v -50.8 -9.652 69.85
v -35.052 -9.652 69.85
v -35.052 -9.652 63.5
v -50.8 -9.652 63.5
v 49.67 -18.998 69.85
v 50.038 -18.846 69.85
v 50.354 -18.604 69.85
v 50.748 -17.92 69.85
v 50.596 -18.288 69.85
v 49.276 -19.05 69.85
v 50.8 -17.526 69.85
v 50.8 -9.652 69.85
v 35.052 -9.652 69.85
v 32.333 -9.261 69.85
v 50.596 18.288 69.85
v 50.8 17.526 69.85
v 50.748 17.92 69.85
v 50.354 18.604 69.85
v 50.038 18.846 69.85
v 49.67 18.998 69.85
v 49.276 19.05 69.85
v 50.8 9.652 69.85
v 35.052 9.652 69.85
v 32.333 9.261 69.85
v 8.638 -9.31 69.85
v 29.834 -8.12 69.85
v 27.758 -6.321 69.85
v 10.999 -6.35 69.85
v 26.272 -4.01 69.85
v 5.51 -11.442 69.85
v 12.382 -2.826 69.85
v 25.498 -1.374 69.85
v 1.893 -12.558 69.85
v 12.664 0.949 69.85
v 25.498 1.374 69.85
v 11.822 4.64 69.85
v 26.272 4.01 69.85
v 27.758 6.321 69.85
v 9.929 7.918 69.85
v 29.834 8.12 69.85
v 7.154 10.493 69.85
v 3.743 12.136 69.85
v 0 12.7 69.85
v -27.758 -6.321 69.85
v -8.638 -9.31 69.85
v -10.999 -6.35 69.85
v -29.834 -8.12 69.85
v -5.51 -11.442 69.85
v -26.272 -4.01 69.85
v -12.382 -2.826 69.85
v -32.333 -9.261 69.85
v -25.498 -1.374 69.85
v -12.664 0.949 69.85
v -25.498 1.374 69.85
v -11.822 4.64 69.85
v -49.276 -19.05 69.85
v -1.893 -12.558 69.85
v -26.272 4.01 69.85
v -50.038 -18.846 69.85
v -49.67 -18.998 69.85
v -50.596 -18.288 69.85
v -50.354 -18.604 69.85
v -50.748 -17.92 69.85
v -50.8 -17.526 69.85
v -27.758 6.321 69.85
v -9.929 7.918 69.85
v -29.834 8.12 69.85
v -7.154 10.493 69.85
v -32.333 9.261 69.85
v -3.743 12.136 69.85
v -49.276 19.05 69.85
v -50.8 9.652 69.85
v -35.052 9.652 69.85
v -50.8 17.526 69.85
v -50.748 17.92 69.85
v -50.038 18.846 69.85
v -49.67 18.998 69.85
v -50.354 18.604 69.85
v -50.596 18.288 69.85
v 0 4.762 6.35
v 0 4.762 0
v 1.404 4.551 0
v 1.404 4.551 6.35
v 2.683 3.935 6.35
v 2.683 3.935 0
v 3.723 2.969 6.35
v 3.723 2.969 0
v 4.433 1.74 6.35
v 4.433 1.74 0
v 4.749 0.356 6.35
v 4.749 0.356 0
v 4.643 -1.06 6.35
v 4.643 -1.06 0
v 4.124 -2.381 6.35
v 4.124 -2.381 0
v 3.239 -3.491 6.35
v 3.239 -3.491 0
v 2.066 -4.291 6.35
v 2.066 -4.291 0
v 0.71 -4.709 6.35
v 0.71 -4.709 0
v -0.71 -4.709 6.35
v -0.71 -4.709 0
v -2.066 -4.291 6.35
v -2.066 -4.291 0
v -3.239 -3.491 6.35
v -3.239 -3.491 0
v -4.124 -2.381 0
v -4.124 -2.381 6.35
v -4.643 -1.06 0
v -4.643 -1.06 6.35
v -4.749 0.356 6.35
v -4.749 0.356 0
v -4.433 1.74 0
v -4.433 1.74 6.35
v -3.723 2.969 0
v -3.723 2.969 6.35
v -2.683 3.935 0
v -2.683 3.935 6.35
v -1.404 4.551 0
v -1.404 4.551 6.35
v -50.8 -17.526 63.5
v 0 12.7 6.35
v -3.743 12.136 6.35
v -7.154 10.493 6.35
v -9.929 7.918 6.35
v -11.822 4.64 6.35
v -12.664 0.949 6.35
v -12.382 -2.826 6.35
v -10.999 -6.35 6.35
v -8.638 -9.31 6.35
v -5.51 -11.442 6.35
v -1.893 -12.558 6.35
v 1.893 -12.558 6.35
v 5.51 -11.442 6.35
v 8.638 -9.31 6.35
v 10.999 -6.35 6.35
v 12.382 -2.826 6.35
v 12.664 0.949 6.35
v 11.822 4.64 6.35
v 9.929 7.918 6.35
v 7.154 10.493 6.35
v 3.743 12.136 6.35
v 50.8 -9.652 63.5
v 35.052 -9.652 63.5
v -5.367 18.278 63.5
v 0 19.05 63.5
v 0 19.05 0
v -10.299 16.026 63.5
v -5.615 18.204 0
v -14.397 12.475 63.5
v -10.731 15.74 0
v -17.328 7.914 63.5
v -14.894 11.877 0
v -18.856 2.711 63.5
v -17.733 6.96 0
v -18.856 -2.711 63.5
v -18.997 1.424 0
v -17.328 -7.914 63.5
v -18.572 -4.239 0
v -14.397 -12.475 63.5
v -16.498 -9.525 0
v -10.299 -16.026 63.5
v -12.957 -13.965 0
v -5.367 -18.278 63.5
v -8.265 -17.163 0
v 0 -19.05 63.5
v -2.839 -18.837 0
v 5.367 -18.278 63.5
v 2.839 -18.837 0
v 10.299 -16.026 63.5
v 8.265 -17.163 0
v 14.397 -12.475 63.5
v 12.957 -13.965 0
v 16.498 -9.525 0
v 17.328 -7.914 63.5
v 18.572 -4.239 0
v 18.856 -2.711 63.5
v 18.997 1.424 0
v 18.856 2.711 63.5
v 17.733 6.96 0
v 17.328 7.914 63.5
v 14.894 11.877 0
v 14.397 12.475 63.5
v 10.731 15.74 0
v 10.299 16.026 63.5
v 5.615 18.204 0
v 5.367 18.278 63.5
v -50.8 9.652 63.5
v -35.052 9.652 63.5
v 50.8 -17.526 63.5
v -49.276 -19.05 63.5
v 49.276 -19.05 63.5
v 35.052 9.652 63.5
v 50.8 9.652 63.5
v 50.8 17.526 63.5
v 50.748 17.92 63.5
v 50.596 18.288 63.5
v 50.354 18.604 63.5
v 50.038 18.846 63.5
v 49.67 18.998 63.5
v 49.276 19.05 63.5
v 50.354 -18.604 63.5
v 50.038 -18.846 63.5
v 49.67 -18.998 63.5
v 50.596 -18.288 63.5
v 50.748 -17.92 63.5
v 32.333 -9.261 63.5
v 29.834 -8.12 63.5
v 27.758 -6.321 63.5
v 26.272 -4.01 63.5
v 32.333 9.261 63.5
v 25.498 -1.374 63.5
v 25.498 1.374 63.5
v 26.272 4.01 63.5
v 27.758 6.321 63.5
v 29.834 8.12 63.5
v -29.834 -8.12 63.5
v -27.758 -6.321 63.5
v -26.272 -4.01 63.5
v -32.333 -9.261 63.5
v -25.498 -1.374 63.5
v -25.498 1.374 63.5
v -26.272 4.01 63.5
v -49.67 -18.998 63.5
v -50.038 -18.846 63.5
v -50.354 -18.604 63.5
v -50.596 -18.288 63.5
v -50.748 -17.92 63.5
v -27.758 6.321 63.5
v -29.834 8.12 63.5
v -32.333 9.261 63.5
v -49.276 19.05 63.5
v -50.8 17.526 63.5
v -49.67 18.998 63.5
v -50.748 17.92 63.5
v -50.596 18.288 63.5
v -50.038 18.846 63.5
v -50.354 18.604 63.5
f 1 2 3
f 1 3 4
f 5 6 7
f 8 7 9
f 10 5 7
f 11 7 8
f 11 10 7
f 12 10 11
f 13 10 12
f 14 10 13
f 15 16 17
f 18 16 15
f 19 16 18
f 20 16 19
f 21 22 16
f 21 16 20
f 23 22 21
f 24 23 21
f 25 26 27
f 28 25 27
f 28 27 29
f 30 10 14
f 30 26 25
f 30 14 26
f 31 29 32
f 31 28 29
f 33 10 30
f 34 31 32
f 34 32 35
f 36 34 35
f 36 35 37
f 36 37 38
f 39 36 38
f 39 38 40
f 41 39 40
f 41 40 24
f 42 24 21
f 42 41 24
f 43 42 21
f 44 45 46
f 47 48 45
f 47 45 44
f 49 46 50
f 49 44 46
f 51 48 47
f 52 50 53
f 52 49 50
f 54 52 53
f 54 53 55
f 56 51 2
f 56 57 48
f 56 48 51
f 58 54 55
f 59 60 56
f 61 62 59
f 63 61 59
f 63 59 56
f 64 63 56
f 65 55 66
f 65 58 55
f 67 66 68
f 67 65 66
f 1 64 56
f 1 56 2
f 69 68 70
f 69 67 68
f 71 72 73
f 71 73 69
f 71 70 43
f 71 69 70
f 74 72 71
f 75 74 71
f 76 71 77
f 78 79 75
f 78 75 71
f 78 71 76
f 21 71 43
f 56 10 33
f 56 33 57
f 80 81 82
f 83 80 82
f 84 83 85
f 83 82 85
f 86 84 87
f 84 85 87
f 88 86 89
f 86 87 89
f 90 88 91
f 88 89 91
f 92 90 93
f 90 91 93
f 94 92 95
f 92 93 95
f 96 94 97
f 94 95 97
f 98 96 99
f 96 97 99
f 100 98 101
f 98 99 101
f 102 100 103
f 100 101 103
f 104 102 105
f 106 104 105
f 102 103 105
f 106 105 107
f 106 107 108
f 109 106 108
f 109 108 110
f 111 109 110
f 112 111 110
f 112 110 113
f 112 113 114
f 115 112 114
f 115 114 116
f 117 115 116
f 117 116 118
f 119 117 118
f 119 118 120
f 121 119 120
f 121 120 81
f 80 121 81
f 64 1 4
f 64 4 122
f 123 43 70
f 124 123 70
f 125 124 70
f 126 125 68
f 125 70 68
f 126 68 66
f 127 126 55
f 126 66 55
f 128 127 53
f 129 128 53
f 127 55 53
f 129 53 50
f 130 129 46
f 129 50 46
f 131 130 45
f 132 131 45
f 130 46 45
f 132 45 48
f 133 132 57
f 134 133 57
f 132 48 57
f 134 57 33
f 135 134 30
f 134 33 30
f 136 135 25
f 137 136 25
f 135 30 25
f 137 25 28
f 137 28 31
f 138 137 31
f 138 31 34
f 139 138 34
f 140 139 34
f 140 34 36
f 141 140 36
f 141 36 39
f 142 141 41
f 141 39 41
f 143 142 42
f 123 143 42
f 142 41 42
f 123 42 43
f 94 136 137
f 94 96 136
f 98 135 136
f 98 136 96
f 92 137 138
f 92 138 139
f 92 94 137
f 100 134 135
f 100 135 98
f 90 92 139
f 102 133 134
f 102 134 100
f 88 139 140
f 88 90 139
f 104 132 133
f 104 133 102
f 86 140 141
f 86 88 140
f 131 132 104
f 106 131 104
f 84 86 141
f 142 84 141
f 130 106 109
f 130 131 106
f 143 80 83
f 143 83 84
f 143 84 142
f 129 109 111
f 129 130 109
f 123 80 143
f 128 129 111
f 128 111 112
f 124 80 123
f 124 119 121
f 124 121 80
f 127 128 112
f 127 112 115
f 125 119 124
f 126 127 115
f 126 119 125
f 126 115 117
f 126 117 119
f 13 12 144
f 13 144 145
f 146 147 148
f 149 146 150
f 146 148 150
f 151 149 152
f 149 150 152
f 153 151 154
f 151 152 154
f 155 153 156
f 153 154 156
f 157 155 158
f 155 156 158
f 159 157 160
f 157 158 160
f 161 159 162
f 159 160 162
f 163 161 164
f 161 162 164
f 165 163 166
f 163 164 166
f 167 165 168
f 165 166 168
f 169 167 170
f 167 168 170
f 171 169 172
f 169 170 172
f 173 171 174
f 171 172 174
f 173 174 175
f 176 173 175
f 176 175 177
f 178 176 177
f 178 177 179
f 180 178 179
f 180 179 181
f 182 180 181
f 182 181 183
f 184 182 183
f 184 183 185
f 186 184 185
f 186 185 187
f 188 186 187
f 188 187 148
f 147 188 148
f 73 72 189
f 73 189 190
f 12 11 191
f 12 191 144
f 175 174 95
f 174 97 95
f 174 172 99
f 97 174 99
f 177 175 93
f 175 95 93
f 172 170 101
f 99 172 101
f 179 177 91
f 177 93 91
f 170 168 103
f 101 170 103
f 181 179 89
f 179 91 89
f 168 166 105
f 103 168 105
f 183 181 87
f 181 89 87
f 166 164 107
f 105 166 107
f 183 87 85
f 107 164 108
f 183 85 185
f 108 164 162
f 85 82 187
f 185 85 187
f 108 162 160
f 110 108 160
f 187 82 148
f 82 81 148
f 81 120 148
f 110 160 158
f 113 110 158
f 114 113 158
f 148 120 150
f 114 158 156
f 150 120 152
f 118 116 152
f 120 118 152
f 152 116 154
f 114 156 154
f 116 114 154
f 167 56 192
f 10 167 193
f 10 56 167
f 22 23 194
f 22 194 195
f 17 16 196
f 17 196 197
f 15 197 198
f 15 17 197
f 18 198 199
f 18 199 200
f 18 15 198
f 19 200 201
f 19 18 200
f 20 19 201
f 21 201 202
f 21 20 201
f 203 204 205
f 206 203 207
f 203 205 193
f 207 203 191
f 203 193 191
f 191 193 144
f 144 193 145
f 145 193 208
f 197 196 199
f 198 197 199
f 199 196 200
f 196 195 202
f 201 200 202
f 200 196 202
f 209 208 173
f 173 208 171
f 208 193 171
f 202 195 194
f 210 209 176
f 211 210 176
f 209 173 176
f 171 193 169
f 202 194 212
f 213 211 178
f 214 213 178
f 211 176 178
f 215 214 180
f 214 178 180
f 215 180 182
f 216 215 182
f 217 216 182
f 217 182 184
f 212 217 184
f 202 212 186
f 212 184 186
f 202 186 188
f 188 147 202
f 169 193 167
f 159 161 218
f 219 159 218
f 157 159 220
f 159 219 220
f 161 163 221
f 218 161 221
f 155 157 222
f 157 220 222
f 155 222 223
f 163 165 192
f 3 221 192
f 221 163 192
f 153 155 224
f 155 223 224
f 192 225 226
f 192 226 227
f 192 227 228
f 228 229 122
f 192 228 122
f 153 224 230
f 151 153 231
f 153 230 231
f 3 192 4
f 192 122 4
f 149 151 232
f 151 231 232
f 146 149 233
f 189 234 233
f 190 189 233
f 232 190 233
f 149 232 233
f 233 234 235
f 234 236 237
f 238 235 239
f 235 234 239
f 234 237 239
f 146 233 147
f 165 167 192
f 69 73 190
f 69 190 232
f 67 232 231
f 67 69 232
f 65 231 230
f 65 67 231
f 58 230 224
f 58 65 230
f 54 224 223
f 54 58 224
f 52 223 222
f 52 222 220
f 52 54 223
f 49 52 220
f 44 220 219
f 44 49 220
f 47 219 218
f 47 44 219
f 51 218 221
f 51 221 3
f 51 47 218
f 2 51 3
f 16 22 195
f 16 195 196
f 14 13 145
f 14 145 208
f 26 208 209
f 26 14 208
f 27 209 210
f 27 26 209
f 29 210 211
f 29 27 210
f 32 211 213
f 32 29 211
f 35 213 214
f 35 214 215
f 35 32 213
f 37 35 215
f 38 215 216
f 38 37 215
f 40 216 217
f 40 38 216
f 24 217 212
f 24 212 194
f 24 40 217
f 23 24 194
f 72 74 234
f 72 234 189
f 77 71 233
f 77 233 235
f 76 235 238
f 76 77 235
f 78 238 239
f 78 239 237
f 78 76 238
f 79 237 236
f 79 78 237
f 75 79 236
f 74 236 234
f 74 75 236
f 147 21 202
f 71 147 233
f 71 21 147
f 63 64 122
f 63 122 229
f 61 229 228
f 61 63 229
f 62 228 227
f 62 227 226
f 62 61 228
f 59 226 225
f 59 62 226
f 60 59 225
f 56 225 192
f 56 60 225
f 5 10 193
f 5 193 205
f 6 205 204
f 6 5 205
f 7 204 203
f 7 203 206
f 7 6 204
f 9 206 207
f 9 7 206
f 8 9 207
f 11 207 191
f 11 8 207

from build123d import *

# Parameters (mm, degrees)
F0_R     = 19.05
F1_DEPTH = 69.85
F2_R     = 12.7
F3_DEPTH = 63.5
F4_R     = 4.7625
F5_DEPTH = 69.851
F7_DEPTH = 6.35
F8_ANGLE = 90


with BuildPart() as f1:
    # F0 (on Top) → F1 (new body)
    with BuildSketch(Plane.XY):
        Circle(F0_R)
    extrude(amount=F1_DEPTH)

    # F2 (on face) → F3 (cut)
    with BuildSketch(Plane.XY.offset(69.85)):
        Circle(F2_R)
    extrude(amount=-F3_DEPTH, mode=Mode.SUBTRACT)

    # F4 (on face) → F5 (cut, through all)
    with BuildSketch(Plane(origin=(0, 0, 0), x_dir=(1, 0, 0), z_dir=(0, 0, -1))):
        Circle(F4_R)
    extrude(amount=-F5_DEPTH, mode=Mode.SUBTRACT)

    # F6 (on face) → F7 (join)
    with BuildSketch(Plane.XY.offset(69.85)):
        with BuildLine():
            Line((9.652, -50.8), (17.526, -50.8))
            ThreePointArc((17.526, -50.8), (18.6036307345, -50.3536307345), (19.05, -49.276))
            Line((19.05, -49.276), (19.05, 0))
            ThreePointArc((19.05, 0), (7.1e-09, -19.05), (-19.05, -1.43e-08))
            Line((-19.05, -1.43e-08), (-19.05, -49.276))
            ThreePointArc((-19.05, -49.276), (-18.6036307345, -50.3536307345), (-17.526, -50.8))
            Line((-17.526, -50.8), (-9.652, -50.8))
            Line((-9.652, -50.8), (-9.652, -35.052))
            ThreePointArc((-9.652, -35.052), (0, -25.4), (9.652, -35.052))
            Line((9.652, -35.052), (9.652, -50.8))
        make_face()
        with BuildLine():
            ThreePointArc((-19.05, -1.43e-08), (-7.1e-09, 19.05), (19.05, 0))
            Line((19.05, 0), (19.05, 49.276))
            ThreePointArc((19.05, 49.276), (18.6036307345, 50.3536307345), (17.526, 50.8))
            Line((17.526, 50.8), (9.652, 50.8))
            Line((9.652, 50.8), (9.652, 35.052))
            ThreePointArc((9.652, 35.052), (0, 25.4), (-9.652, 35.052))
            Line((-9.652, 35.052), (-9.652, 50.8))
            Line((-9.652, 50.8), (-17.526, 50.8))
            ThreePointArc((-17.526, 50.8), (-18.6036307345, 50.3536307345), (-19.05, 49.276))
            Line((-19.05, 49.276), (-19.05, -1.43e-08))
        make_face()
    extrude(amount=-F7_DEPTH)


with BuildPart() as f1_1:
    # F8: moved
    add(f1.part.rotate(Axis((0, 0, 69.85), (0, 0, 1)), F8_ANGLE))


solid = f1_1.part
